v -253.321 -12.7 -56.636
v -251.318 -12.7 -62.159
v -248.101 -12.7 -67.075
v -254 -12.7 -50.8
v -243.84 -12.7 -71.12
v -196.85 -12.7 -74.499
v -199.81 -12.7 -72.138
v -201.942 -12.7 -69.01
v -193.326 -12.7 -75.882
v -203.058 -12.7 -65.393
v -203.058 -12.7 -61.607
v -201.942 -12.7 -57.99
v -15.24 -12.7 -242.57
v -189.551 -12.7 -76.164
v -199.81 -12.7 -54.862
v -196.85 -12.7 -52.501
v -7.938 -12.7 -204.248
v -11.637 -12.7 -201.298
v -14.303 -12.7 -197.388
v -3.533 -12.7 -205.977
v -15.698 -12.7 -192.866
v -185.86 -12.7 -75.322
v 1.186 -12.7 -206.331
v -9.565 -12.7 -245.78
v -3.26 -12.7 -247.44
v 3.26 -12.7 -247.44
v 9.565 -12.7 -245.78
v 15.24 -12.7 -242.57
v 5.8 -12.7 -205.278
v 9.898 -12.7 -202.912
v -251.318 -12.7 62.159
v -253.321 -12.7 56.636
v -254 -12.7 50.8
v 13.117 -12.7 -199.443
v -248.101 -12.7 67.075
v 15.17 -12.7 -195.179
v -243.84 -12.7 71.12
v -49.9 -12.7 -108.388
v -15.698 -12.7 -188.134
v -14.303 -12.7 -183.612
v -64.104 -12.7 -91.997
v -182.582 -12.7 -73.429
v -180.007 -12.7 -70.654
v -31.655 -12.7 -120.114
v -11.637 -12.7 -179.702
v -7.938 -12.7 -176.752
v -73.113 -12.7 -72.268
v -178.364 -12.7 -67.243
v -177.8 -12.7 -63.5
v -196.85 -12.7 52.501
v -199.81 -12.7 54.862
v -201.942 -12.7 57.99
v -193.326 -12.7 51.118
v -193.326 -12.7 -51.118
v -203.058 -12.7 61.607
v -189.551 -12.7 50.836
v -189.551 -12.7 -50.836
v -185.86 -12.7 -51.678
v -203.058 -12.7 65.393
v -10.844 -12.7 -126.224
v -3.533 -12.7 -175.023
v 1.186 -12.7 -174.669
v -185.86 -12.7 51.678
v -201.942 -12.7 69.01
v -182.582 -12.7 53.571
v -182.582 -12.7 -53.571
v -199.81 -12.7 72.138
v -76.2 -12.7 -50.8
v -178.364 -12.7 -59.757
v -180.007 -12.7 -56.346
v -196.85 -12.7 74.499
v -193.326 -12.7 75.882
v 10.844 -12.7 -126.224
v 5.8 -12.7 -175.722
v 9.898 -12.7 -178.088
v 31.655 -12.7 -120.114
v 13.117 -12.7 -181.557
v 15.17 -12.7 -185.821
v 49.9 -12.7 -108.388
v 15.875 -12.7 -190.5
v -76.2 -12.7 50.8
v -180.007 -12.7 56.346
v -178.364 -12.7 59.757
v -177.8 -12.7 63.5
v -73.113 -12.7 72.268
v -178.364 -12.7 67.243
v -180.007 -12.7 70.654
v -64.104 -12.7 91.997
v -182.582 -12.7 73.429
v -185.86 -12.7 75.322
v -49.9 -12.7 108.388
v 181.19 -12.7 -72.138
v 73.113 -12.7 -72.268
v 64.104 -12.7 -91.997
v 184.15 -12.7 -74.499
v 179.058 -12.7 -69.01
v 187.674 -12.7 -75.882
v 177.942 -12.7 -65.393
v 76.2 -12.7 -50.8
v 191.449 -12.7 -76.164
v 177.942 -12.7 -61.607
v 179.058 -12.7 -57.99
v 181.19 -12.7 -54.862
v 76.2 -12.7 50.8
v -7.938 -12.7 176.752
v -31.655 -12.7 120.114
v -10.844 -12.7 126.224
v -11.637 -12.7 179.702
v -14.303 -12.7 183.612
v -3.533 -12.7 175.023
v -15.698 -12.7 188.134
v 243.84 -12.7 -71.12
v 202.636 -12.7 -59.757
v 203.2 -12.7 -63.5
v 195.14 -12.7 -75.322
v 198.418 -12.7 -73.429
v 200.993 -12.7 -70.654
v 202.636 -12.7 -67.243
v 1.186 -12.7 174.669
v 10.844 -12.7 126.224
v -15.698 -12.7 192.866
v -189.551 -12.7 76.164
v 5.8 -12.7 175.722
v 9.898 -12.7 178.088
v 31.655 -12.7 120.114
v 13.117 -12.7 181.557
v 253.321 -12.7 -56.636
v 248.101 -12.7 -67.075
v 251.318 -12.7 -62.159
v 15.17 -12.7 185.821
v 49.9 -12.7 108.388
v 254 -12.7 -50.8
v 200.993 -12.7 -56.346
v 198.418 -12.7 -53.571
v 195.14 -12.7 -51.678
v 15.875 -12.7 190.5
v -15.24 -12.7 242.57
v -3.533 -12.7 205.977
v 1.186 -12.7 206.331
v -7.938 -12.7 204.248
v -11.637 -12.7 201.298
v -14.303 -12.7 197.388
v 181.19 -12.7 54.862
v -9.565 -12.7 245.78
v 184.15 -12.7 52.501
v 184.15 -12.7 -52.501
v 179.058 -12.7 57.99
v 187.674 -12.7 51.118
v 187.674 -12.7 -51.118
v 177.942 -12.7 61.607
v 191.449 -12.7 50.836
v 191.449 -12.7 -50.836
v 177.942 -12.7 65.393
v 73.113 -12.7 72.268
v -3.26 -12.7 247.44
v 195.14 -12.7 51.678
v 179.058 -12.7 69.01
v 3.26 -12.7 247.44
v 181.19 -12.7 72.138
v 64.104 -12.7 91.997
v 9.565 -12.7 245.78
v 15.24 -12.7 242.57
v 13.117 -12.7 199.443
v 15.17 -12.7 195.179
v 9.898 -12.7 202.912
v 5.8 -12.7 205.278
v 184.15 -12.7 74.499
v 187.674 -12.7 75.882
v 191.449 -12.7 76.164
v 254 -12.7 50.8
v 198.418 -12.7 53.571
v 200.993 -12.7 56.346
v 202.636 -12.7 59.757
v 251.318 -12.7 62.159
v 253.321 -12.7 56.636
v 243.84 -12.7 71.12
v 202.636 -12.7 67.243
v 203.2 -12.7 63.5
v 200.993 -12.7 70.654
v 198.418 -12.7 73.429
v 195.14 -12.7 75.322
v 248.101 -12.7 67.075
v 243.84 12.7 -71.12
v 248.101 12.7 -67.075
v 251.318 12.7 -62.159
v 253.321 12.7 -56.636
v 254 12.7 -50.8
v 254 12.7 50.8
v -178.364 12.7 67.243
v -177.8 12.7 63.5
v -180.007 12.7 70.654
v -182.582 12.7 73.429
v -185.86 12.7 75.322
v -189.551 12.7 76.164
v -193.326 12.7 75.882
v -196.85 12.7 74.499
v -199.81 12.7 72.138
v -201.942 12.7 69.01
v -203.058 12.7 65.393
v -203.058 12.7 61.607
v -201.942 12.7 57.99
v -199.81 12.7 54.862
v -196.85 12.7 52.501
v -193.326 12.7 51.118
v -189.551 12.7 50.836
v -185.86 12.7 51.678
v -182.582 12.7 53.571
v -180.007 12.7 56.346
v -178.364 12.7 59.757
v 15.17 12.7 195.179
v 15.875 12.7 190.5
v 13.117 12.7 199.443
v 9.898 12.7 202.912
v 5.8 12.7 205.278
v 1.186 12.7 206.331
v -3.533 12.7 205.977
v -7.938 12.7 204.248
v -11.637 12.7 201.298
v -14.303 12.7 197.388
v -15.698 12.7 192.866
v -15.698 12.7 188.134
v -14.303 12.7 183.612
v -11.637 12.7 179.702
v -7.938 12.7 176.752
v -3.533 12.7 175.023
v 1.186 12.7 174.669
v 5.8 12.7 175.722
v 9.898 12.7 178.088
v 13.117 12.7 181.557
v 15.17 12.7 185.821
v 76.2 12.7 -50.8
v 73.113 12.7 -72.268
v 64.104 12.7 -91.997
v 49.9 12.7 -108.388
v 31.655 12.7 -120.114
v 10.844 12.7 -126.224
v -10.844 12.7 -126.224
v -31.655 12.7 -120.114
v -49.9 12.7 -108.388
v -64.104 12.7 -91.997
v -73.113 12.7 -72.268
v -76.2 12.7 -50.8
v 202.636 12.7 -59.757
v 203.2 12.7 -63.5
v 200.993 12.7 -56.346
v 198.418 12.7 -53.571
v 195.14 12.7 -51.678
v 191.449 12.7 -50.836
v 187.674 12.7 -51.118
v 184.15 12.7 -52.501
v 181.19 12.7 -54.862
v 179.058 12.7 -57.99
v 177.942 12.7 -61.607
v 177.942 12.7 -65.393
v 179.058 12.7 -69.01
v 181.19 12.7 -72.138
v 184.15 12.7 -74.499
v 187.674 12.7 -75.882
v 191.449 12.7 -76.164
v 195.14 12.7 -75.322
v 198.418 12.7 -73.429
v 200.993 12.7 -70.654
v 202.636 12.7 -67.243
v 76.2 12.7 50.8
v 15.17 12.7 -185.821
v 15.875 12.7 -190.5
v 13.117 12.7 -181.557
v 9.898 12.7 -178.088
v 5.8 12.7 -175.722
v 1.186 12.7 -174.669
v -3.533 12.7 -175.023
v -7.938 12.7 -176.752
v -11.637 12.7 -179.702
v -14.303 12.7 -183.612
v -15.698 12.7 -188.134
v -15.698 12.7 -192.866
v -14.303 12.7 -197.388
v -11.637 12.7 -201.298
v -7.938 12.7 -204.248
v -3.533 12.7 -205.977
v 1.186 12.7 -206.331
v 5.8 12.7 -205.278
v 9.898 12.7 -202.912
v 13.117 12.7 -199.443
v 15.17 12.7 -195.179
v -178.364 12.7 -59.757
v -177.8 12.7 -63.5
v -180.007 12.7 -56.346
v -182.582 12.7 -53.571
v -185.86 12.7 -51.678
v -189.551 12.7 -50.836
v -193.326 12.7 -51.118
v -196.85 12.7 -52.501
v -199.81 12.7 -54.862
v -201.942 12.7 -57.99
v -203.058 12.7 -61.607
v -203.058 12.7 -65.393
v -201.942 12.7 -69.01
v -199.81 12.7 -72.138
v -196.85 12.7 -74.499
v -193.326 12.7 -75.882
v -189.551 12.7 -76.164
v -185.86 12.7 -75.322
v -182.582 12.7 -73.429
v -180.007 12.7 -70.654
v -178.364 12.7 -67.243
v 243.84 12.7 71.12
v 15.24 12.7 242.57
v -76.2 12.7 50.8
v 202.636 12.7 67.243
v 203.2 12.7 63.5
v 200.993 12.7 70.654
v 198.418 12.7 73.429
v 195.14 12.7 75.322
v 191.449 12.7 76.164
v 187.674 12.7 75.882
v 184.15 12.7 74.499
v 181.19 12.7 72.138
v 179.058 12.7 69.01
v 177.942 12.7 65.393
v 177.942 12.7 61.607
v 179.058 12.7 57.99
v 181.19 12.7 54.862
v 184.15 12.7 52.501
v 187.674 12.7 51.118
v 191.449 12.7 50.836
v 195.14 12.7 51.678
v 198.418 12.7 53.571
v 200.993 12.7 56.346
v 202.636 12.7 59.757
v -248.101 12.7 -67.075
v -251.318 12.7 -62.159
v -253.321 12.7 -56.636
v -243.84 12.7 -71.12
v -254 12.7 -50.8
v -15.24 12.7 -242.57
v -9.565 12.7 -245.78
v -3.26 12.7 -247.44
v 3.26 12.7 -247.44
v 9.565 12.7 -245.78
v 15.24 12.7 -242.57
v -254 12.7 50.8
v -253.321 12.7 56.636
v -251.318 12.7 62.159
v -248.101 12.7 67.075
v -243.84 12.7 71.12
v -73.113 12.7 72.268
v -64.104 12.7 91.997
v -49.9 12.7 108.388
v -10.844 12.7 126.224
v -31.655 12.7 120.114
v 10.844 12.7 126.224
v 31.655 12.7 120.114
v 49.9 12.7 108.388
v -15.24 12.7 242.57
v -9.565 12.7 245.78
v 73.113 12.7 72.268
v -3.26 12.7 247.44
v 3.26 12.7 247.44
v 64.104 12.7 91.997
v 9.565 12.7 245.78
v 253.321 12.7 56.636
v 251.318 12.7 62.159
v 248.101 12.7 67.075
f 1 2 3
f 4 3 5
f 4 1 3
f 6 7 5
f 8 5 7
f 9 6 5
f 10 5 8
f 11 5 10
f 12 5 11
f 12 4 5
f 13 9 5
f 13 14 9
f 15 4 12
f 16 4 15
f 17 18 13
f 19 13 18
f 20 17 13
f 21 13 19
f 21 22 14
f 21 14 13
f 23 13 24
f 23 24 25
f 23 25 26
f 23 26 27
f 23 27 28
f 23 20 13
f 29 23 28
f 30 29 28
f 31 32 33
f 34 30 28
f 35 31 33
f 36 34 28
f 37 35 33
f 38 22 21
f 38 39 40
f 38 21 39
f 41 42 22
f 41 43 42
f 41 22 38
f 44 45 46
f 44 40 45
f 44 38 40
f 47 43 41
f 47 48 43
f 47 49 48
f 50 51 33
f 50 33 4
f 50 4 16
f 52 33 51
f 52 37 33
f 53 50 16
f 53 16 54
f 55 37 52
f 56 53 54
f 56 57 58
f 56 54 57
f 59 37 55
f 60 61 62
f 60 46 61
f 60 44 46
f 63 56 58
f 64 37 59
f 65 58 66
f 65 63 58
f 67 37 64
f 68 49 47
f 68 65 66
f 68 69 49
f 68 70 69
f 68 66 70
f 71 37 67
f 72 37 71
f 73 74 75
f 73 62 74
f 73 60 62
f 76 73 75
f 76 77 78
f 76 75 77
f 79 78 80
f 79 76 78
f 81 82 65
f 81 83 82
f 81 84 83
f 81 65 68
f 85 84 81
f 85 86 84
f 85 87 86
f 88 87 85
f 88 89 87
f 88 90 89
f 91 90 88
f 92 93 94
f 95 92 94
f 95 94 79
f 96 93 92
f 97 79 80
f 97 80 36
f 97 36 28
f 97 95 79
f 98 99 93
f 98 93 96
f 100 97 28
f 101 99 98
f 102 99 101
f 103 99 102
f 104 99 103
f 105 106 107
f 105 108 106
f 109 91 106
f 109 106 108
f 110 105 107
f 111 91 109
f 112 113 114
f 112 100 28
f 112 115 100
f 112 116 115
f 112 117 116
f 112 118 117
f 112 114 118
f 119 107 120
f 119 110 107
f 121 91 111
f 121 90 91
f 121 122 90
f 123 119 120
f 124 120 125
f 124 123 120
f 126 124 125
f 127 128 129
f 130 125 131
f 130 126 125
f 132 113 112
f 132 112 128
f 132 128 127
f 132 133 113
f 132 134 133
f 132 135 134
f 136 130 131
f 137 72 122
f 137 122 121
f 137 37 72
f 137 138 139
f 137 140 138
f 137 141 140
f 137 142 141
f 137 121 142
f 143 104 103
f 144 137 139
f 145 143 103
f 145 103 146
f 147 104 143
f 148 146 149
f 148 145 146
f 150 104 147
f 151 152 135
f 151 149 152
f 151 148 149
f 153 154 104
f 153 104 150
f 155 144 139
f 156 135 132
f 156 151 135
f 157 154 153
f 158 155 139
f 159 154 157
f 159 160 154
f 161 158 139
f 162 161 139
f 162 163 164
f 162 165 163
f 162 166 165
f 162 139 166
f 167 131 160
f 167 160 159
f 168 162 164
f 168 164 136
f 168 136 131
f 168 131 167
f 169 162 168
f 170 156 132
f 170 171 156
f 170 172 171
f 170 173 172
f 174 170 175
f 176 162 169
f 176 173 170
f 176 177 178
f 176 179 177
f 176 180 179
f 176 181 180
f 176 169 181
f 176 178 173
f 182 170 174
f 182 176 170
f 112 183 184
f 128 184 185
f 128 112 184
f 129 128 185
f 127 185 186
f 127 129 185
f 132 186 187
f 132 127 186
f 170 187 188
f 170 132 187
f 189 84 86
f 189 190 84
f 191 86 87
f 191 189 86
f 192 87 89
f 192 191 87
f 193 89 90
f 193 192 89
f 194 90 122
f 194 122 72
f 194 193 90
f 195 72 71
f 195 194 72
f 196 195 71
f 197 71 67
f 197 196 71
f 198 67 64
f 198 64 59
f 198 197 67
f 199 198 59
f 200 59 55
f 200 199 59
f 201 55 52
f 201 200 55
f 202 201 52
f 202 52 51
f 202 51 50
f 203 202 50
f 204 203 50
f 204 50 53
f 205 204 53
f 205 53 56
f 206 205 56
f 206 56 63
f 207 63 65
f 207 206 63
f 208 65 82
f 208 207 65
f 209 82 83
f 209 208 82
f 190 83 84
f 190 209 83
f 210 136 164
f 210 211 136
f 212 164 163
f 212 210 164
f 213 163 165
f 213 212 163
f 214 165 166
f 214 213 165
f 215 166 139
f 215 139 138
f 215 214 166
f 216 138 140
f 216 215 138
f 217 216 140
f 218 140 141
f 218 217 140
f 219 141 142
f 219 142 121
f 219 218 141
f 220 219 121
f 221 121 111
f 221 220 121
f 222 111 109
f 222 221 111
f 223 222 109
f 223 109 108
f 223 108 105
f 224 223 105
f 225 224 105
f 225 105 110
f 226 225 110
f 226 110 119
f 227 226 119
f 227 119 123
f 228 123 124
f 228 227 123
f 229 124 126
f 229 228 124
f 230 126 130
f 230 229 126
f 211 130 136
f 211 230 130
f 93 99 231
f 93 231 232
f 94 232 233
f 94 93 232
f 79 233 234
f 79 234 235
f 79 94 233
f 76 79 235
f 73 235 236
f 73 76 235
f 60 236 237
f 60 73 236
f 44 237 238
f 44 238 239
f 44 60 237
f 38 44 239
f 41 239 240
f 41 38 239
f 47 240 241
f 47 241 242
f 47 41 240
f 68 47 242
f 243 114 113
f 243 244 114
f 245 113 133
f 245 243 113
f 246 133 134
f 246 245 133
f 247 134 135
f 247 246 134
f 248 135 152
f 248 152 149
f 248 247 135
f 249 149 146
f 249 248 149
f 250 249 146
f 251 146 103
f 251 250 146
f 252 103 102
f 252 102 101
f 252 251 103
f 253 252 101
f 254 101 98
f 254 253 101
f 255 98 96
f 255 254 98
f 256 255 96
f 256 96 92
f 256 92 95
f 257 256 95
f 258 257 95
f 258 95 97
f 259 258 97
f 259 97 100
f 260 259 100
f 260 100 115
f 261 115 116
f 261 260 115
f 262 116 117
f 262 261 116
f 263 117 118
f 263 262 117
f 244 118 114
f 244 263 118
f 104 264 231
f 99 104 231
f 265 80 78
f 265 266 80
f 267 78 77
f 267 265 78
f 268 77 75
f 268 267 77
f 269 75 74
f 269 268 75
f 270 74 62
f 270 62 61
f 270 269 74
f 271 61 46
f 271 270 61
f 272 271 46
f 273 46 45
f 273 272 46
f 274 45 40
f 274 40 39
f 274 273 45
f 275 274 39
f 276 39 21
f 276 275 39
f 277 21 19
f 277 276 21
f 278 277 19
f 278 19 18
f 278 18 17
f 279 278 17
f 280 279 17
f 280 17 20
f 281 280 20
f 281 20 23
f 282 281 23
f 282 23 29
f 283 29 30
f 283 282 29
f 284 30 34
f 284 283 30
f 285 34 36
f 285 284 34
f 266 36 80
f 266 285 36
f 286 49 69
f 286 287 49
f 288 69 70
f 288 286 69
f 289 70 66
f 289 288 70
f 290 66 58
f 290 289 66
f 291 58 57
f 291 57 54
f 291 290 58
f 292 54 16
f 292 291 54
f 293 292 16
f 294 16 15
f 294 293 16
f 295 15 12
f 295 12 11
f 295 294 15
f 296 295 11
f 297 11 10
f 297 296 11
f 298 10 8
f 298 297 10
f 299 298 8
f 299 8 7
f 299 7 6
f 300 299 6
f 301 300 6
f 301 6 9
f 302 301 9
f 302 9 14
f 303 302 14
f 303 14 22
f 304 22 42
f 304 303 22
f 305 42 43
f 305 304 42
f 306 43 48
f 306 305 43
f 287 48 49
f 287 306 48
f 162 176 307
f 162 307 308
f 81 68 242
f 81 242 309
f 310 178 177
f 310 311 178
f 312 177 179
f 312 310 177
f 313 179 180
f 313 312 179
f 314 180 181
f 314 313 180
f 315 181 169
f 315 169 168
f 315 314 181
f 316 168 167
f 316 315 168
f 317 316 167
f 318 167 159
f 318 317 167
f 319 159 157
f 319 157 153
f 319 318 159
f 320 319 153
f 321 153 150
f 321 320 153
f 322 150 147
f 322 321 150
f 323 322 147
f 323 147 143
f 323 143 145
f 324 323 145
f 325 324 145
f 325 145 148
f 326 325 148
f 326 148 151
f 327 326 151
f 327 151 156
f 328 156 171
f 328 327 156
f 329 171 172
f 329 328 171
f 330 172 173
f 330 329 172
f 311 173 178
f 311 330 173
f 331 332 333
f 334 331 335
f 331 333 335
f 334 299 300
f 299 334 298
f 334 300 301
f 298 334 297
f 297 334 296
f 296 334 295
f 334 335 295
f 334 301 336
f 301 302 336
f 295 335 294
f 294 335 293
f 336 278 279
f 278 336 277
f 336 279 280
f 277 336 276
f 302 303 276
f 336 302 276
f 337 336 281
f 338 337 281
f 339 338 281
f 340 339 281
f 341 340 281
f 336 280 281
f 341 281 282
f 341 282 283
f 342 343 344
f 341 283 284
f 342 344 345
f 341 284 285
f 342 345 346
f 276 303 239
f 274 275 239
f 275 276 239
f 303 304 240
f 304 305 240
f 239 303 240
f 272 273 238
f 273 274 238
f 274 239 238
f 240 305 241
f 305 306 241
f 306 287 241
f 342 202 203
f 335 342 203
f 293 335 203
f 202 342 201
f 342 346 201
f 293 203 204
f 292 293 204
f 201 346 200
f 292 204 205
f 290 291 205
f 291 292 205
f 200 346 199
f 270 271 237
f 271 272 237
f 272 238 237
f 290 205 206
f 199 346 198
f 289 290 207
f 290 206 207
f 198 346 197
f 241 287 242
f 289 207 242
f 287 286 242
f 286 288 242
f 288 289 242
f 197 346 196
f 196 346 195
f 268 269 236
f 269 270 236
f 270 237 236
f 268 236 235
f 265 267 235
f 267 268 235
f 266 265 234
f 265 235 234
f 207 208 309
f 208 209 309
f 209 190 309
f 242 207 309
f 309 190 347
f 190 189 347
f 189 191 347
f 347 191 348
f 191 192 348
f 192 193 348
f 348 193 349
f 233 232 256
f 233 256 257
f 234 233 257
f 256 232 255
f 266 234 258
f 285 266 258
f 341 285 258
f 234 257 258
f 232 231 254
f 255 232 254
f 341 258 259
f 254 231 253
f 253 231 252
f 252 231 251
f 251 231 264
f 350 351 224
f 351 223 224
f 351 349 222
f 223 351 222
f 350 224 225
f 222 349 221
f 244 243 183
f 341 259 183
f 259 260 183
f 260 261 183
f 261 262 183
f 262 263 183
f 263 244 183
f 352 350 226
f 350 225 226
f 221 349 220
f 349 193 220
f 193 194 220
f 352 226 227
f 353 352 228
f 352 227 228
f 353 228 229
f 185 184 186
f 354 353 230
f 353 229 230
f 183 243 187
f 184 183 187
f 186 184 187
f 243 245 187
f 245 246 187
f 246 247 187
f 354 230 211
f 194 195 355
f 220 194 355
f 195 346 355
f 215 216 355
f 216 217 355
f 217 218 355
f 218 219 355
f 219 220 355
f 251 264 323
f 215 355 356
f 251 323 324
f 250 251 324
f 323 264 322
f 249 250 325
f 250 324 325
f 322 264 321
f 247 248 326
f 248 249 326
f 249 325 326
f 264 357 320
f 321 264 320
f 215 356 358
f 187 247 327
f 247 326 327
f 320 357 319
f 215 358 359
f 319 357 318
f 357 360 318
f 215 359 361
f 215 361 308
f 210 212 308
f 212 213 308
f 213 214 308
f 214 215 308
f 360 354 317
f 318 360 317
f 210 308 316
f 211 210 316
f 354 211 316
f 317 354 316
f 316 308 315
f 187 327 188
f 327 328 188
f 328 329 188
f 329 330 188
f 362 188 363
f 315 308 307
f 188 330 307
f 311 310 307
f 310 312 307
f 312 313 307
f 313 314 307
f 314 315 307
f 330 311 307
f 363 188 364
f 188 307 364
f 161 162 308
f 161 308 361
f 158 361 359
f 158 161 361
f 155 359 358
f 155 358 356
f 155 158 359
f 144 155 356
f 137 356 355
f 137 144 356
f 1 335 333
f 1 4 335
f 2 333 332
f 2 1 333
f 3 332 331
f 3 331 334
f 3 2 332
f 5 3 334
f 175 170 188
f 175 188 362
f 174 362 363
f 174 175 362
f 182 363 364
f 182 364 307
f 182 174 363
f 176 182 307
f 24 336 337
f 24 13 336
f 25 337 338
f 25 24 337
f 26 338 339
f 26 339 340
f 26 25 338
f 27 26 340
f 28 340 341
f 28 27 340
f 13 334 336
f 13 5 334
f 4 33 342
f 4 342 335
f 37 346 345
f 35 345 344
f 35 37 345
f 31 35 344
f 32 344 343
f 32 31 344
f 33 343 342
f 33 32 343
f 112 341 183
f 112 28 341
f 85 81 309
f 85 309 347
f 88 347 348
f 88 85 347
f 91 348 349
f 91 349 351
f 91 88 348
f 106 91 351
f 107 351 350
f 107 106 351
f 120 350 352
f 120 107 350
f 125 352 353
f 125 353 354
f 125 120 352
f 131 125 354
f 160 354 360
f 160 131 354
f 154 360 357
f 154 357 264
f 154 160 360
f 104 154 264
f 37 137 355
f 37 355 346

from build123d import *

# Parameters (mm, degrees)
F0_R     = 12.7
F0_R_2   = 15.875
F1_DEPTH = 12.7


with BuildPart() as f1:
    # F0 (on Front) → F1 (new body, symmetric)
    with BuildSketch(Plane.XZ):
        with BuildLine():
            Line((254, -50.8), (254, 50.8))
            ThreePointArc((254, 50.8), (251.318451, 62.159225), (243.84, 71.12))
            Line((243.84, 71.12), (15.24, 242.57))
            ThreePointArc((15.24, 242.57), (0, 247.65), (-15.24, 242.57))
            Line((-15.24, 242.57), (-243.84, 71.12))
            ThreePointArc((-243.84, 71.12), (-251.318451, 62.159225), (-254, 50.8))
            Line((-254, 50.8), (-254, -50.8))
            ThreePointArc((-254, -50.8), (-251.318451, -62.159225), (-243.84, -71.12))
            Line((-243.84, -71.12), (-15.24, -242.57))
            ThreePointArc((-15.24, -242.57), (0, -247.65), (15.24, -242.57))
            Line((15.24, -242.57), (243.84, -71.12))
            ThreePointArc((243.84, -71.12), (251.318451, -62.159225), (254, -50.8))
        make_face()
        with Locations((-190.5, -63.5)):
            Circle(F0_R, mode=Mode.SUBTRACT)
        with Locations((0, -190.5)):
            Circle(F0_R_2, mode=Mode.SUBTRACT)
        with Locations((190.5, -63.5)):
            Circle(F0_R, mode=Mode.SUBTRACT)
        with Locations((-190.5, 63.5)):
            Circle(F0_R, mode=Mode.SUBTRACT)
        with BuildLine():
            ThreePointArc((-76.2, 50.8), (0, 127), (76.2, 50.8))
            Line((76.2, 50.8), (76.2, -50.8))
            ThreePointArc((76.2, -50.8), (0, -127), (-76.2, -50.8))
            Line((-76.2, -50.8), (-76.2, 50.8))
        make_face(mode=Mode.SUBTRACT)
        with Locations((190.5, 63.5)):
            Circle(F0_R, mode=Mode.SUBTRACT)
        with Locations((0, 190.5)):
            Circle(F0_R_2, mode=Mode.SUBTRACT)
    extrude(amount=F1_DEPTH, both=True)


solid = f1.part
